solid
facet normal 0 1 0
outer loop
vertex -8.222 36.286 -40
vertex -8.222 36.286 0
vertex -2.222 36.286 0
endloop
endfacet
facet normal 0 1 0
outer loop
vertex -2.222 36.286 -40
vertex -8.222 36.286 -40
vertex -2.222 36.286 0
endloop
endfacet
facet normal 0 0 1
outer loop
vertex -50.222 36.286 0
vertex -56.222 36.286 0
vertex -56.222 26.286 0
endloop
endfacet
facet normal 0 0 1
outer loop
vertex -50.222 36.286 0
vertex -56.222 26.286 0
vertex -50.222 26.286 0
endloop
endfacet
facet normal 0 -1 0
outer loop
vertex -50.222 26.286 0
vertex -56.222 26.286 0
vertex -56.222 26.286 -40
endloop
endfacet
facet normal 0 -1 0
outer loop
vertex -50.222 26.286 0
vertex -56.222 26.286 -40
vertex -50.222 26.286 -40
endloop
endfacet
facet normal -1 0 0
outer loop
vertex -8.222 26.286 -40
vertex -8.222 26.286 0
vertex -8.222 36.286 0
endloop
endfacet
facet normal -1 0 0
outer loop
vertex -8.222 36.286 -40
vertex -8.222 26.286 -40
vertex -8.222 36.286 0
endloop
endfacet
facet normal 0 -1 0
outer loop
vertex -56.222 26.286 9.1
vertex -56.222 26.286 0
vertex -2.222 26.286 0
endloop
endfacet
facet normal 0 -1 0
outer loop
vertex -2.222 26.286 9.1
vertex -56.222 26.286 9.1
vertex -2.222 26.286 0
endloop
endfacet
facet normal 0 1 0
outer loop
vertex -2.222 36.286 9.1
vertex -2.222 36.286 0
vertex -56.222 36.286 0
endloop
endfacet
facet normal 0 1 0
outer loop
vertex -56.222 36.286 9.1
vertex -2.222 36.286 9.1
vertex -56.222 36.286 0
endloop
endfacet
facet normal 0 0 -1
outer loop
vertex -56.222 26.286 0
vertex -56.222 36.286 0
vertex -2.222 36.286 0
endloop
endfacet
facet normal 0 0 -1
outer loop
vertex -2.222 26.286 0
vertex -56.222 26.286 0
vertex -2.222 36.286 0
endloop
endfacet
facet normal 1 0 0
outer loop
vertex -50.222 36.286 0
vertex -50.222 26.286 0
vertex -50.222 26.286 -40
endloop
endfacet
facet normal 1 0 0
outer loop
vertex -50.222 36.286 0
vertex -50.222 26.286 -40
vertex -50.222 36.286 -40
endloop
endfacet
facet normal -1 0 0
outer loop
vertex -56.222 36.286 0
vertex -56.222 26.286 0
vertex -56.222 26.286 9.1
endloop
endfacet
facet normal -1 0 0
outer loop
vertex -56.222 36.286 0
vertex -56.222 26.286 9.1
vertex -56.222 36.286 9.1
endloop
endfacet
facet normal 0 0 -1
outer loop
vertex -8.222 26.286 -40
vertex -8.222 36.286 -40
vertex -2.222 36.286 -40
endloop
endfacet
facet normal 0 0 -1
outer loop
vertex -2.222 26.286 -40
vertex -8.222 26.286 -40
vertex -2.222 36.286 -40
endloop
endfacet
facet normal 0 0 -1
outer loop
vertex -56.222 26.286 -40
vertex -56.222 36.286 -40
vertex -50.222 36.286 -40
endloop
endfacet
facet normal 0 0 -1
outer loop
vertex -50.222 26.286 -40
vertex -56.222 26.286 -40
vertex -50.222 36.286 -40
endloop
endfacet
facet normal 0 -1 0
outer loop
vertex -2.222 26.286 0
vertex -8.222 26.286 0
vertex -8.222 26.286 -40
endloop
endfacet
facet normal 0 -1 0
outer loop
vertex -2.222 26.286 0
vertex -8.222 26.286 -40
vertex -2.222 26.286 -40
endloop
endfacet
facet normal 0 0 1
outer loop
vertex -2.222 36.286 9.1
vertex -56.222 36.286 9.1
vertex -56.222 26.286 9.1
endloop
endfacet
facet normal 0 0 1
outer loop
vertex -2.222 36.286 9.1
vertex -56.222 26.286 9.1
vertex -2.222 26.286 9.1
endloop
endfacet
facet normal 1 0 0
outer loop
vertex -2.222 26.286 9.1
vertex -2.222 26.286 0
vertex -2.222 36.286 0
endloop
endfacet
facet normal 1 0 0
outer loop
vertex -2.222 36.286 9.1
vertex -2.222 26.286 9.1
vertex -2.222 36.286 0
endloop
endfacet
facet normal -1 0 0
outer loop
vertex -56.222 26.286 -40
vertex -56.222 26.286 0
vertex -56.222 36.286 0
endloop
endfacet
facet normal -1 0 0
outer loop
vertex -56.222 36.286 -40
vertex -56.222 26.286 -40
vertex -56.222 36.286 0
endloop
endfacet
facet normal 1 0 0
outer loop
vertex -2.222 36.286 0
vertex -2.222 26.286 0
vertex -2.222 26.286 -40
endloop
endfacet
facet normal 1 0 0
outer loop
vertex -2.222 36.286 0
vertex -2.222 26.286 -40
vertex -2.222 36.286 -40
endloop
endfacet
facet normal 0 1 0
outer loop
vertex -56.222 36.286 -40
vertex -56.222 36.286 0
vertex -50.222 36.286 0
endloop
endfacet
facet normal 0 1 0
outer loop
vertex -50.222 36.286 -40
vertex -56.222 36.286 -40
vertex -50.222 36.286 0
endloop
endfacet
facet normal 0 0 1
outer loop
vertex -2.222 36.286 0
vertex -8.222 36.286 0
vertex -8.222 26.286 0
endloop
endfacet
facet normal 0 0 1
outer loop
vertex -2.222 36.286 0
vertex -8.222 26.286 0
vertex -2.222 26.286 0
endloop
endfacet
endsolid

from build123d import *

# Parameters (mm, degrees)
F0_W     = 6
F0_H     = 10
F1_DEPTH = 40
F2_DEPTH = 9.1


with BuildPart() as f1:
    # F0 (on Top) → F1 (new body)
    with BuildSketch(Plane.XY):
        with Locations((-5.2217, 31.285606)):
            Rectangle(F0_W, F0_H)
        with Locations((-53.2217, 31.285606)):
            Rectangle(F0_W, F0_H)
    extrude(amount=-F1_DEPTH)


with BuildPart() as f2:
    # F0 (on Top) → F2 (new body)
    with BuildSketch(Plane.XY):
        with Locations((-53.2217, 31.285606)):
            Rectangle(F0_W, F0_H)
        Polygon((-8.2217, 36.285606), (-50.2217, 36.285606), (-50.2217, 26.285606), (-19.987069, 26.285606), (-13.240066, 26.285606), (-8.2217, 26.285606), align=None)
        with Locations((-5.2217, 31.285606)):
            Rectangle(F0_W, F0_H)
    extrude(amount=F2_DEPTH)


solid = Compound([f1.part, f2.part])
